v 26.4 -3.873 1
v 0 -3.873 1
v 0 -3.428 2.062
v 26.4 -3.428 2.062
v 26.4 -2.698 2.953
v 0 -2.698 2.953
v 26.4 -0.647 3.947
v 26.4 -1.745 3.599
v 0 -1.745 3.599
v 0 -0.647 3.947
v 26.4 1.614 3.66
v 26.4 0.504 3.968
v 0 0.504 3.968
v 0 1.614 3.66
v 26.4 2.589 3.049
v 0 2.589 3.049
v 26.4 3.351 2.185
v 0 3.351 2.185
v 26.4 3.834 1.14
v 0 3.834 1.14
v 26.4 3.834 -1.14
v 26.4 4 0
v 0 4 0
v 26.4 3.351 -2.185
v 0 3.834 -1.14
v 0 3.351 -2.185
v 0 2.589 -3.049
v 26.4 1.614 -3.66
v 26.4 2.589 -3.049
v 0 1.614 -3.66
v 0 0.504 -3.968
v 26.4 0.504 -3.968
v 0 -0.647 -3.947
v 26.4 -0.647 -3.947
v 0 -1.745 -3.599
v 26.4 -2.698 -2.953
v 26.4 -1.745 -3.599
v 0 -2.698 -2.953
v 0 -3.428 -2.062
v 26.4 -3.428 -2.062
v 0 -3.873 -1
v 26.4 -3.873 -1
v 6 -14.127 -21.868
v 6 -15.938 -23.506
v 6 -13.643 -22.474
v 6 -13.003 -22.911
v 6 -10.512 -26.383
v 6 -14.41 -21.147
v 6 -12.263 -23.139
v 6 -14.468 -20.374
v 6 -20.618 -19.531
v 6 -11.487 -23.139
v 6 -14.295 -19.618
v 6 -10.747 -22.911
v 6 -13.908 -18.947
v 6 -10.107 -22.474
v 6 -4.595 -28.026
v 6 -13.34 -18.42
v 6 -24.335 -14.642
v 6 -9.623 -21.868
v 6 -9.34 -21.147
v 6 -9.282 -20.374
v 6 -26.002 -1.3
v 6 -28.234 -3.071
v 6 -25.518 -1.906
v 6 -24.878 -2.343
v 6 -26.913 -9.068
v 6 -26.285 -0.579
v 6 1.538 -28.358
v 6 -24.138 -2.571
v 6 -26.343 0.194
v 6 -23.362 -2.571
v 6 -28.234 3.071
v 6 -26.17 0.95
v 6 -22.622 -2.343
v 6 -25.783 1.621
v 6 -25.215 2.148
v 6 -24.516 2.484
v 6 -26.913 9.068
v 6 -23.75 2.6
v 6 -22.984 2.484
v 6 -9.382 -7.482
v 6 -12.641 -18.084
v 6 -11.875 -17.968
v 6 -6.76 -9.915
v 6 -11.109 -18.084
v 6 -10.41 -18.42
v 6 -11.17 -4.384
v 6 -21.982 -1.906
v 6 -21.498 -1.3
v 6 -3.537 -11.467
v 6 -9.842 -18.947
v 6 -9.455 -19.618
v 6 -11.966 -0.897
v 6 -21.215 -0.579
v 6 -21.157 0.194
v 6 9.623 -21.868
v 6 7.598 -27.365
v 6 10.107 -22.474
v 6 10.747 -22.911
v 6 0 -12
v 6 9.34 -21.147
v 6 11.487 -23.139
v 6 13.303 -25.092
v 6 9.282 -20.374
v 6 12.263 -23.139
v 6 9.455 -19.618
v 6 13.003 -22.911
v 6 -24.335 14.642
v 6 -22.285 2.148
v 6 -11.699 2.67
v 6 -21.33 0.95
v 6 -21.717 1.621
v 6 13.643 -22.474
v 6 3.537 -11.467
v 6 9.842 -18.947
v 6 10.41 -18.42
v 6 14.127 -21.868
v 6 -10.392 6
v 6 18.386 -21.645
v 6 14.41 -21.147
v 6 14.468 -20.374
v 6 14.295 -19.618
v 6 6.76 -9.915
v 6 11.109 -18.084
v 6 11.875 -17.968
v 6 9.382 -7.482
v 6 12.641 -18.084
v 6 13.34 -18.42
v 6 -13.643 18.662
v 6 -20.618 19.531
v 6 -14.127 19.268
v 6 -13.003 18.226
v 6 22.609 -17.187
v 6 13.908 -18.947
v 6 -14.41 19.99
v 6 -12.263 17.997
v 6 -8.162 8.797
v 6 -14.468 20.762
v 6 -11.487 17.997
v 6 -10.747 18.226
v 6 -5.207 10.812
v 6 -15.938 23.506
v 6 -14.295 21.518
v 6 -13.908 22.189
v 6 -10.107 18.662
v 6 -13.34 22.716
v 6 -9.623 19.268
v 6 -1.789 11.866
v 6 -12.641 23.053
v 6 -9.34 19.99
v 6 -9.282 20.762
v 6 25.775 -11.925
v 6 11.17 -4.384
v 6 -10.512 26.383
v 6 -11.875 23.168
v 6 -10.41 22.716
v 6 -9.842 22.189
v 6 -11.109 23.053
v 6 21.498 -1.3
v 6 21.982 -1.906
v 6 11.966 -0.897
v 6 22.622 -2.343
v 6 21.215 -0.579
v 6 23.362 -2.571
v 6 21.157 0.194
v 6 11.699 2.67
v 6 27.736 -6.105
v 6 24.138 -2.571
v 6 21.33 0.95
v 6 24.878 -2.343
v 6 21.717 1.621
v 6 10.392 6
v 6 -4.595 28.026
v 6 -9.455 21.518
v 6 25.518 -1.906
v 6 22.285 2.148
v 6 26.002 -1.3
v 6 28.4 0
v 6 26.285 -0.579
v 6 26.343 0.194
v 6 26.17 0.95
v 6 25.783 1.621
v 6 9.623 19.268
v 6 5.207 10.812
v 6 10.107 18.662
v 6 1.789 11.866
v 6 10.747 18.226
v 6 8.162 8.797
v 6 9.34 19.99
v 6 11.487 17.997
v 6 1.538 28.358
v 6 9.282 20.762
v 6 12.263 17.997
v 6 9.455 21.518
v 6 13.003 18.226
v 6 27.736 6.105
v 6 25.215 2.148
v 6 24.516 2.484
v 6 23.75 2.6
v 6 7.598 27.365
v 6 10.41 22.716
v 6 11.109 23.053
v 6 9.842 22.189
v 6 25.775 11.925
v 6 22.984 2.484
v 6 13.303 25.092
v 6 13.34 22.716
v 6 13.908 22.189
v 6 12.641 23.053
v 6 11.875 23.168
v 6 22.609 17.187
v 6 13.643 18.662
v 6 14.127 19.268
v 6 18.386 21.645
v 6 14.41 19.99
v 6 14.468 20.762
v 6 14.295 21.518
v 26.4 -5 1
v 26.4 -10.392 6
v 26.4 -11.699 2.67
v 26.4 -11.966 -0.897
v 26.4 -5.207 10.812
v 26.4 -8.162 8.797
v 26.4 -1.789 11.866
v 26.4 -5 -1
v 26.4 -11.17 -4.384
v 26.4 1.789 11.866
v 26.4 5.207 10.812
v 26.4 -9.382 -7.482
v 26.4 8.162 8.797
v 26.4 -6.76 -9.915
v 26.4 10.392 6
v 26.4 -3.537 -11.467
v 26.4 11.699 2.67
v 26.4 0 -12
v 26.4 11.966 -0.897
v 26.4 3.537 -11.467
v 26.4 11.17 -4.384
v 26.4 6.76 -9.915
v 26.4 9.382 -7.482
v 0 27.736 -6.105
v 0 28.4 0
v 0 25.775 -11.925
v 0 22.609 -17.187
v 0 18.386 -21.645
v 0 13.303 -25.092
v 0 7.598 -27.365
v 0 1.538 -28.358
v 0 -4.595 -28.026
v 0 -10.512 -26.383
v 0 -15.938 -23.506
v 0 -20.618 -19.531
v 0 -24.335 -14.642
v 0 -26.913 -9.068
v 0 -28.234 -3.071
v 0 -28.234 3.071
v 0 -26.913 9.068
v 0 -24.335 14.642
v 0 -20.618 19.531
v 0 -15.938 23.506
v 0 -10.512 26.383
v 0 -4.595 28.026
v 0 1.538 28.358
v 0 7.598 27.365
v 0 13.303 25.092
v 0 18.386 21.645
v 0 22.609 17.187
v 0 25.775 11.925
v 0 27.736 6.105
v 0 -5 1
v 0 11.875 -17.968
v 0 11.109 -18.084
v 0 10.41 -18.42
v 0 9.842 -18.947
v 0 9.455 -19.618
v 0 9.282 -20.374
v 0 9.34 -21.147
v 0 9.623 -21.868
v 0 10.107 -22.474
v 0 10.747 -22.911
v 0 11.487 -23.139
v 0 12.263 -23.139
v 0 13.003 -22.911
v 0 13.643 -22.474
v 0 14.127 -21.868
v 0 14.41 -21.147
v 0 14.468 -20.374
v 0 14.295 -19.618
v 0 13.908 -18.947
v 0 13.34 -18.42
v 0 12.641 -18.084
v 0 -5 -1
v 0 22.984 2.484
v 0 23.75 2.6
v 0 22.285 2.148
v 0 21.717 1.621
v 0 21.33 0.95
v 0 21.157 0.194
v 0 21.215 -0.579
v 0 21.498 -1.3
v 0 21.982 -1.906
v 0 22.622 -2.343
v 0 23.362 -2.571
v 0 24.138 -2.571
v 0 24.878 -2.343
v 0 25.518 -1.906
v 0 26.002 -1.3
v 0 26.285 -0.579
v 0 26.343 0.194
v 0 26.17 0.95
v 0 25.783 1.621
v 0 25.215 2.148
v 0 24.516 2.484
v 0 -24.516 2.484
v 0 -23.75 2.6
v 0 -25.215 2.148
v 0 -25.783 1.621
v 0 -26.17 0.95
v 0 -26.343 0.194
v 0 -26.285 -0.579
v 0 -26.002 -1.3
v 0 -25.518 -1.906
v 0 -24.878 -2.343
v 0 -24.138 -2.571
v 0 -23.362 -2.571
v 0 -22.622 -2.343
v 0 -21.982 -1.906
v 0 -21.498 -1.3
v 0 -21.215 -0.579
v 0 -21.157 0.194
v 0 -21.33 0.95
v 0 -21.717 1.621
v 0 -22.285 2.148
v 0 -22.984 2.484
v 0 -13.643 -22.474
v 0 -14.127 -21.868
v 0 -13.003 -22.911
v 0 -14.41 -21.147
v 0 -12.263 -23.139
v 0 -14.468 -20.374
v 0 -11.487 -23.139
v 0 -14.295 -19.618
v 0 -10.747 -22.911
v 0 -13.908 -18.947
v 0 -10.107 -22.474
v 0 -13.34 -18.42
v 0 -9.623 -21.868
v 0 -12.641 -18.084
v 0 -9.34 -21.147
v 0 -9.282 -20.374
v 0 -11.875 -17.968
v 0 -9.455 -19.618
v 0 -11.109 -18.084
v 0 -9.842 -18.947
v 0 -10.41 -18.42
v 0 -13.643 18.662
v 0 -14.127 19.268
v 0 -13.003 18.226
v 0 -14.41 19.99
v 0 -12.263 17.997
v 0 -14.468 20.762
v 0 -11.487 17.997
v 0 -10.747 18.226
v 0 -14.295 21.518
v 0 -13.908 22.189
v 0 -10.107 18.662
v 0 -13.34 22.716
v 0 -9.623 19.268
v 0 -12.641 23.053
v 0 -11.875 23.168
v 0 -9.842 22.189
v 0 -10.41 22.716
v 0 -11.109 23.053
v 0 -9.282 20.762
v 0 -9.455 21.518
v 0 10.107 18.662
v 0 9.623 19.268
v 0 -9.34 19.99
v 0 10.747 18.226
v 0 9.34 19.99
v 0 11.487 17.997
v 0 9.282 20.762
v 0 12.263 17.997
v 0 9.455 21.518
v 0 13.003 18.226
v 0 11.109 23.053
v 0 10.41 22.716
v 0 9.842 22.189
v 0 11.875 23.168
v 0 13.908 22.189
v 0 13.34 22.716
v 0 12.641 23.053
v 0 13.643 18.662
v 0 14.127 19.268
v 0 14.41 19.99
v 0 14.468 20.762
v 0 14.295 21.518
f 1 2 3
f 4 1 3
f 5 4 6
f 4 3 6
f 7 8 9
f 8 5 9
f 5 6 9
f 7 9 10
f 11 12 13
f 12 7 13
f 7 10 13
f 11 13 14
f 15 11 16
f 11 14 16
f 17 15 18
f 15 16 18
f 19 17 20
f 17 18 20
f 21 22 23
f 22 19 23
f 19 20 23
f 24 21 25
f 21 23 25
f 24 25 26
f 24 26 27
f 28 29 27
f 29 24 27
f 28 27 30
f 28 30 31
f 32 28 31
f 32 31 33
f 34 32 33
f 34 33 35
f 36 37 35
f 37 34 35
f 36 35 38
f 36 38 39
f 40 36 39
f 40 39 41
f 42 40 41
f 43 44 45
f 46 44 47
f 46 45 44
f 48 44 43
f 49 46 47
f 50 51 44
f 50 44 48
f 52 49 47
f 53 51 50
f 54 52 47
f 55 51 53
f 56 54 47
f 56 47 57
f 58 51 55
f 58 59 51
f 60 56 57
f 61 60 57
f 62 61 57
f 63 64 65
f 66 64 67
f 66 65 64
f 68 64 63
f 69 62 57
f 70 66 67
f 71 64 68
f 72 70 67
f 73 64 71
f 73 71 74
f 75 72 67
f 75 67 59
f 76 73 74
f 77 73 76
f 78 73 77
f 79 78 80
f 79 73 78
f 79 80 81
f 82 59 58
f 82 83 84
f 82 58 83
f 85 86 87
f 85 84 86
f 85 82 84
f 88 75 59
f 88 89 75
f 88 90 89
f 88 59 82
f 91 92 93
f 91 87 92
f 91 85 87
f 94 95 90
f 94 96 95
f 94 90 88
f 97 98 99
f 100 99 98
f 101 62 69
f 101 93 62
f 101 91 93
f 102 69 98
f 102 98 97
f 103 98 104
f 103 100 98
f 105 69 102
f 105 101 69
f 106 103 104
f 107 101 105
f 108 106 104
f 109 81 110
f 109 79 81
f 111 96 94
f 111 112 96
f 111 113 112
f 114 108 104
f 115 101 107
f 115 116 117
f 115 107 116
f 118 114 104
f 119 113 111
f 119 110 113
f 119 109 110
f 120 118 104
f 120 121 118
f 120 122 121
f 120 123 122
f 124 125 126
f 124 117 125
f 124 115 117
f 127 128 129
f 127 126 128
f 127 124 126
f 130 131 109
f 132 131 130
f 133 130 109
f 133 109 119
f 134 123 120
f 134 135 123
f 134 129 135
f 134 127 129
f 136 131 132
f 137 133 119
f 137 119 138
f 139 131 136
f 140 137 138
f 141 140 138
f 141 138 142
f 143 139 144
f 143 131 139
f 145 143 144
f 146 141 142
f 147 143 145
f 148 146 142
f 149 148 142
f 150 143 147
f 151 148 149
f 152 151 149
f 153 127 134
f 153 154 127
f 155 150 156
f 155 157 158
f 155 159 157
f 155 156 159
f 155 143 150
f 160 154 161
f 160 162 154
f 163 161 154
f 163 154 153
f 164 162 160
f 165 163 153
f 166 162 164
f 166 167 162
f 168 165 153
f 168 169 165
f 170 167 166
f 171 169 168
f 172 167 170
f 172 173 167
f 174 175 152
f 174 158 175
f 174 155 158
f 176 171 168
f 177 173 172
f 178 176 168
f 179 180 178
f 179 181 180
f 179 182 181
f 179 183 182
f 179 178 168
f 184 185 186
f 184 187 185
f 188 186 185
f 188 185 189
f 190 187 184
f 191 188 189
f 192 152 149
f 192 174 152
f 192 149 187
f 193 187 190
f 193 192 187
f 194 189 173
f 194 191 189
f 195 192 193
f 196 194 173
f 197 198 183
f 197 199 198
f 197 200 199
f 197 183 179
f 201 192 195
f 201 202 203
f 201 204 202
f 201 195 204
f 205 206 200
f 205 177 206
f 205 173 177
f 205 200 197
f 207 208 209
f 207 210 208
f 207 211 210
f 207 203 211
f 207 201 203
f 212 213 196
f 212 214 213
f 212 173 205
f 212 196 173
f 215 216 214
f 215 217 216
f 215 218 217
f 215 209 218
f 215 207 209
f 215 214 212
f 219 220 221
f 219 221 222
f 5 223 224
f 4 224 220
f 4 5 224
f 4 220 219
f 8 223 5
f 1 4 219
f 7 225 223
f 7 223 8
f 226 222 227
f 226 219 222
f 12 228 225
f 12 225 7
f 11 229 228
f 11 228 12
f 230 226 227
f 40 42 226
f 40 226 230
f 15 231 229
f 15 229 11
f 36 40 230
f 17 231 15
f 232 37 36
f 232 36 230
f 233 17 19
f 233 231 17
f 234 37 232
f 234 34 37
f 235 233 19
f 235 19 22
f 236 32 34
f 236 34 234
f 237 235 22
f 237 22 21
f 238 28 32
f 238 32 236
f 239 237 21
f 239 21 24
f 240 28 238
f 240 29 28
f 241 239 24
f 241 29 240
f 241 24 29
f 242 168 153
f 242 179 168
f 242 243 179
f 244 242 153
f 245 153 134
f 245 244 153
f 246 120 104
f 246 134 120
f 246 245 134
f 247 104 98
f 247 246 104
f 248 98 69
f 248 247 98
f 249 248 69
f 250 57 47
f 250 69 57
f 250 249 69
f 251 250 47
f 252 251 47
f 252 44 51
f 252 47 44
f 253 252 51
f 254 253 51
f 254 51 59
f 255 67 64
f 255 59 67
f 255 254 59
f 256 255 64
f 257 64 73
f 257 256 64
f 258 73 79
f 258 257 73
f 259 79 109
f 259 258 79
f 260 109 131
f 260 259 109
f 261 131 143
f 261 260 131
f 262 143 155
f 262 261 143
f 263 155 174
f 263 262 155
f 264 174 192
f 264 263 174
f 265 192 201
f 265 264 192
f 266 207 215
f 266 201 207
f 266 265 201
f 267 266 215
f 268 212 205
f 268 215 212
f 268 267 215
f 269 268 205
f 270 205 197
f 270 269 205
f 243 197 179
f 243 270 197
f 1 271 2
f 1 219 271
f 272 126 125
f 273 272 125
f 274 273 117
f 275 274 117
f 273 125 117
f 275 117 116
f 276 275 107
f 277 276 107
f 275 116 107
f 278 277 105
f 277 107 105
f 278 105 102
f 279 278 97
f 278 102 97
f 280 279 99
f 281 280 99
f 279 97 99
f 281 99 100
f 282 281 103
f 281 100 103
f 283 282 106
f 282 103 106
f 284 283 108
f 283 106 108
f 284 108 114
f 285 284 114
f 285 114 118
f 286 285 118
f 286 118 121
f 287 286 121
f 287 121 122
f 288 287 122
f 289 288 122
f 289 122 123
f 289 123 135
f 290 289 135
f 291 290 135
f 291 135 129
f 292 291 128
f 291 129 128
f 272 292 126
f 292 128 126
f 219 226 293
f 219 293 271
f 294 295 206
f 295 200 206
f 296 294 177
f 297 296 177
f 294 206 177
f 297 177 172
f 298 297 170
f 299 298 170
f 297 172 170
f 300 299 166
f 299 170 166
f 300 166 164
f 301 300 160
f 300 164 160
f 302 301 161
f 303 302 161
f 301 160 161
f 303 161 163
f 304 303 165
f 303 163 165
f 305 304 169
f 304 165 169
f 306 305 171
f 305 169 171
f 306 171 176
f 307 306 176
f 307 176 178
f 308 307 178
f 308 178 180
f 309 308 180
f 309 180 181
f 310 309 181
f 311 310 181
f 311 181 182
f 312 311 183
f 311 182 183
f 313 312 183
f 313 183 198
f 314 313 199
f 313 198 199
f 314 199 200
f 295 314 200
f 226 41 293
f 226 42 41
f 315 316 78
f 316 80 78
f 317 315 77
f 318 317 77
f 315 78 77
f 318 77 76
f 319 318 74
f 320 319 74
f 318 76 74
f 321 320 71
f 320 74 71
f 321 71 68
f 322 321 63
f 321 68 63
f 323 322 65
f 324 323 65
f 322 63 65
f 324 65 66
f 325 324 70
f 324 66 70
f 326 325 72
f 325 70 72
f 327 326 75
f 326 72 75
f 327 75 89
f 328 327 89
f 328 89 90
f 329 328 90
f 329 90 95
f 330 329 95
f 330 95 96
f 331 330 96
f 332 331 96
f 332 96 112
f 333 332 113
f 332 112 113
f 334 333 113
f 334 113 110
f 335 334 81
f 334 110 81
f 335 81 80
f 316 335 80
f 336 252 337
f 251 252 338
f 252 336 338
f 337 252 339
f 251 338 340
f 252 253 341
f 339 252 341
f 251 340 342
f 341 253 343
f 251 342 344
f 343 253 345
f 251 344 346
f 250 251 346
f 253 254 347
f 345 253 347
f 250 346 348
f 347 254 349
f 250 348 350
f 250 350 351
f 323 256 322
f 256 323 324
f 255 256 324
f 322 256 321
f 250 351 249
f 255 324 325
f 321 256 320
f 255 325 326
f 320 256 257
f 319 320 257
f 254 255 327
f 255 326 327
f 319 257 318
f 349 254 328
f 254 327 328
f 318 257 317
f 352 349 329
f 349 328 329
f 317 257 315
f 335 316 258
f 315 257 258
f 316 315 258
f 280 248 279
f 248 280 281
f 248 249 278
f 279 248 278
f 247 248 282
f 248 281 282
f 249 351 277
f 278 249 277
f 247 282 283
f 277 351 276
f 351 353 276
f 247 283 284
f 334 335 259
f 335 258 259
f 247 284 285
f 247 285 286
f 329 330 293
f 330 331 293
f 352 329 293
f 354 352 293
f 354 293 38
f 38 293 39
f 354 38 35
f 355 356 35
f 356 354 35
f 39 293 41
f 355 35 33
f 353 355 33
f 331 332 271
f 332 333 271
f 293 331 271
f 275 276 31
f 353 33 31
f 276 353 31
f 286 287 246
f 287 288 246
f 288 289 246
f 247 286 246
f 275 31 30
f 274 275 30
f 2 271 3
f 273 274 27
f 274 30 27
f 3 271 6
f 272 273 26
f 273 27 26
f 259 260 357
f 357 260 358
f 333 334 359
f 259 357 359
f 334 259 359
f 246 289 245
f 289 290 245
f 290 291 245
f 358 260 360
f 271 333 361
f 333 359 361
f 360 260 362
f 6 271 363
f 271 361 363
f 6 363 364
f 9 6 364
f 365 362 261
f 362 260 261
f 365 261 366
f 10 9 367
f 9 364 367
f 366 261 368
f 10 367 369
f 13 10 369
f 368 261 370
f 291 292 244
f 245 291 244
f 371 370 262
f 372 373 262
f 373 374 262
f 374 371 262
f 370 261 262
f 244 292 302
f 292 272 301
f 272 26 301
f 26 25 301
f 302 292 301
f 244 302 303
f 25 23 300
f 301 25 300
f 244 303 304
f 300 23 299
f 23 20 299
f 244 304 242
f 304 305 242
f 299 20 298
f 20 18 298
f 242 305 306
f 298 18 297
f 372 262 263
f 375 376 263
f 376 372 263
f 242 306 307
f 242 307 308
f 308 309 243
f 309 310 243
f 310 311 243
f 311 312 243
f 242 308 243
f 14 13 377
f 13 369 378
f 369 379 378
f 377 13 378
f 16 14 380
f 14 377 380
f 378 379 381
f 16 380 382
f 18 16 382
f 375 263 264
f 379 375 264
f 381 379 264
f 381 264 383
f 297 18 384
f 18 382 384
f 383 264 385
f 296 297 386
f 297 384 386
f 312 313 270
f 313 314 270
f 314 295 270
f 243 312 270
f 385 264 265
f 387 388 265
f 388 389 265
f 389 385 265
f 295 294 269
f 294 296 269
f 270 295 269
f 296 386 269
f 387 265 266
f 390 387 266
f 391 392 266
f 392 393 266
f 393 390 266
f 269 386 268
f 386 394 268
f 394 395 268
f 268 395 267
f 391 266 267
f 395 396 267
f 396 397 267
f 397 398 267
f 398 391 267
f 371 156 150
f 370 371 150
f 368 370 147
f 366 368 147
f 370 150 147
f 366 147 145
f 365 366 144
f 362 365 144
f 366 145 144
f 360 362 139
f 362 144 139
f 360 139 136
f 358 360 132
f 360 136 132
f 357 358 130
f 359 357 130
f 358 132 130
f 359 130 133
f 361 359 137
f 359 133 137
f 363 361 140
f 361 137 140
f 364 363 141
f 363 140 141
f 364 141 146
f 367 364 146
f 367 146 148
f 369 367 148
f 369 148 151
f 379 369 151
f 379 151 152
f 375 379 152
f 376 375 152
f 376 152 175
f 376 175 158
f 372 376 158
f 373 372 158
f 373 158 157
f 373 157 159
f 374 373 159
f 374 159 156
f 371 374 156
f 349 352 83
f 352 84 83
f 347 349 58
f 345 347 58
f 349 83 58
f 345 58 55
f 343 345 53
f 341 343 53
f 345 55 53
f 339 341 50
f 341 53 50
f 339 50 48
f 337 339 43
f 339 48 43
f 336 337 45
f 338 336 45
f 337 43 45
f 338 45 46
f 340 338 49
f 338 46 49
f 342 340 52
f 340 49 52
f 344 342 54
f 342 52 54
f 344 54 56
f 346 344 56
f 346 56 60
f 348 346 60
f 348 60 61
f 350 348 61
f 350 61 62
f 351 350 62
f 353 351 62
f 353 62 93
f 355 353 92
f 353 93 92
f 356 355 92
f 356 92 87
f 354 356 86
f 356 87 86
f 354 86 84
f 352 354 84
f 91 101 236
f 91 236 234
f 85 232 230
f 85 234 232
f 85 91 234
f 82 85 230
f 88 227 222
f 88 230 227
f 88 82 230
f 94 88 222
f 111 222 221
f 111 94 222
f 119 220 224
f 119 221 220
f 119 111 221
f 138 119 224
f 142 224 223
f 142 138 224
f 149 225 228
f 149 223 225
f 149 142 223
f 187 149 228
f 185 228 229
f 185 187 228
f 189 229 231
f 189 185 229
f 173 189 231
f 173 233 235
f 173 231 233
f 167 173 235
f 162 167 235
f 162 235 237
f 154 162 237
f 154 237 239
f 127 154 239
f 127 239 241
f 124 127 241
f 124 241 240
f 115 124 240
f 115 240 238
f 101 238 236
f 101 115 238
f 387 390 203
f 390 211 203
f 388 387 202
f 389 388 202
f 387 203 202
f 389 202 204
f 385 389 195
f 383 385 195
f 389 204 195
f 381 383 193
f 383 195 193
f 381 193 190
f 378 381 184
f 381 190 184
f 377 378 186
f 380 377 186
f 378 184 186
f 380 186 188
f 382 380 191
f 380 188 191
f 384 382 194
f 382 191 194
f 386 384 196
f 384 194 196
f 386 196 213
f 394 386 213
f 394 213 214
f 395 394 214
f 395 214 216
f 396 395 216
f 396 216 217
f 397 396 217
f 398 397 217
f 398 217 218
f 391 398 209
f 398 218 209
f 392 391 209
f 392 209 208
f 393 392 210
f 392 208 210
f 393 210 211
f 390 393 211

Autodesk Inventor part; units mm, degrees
ref_plane "YZ Plane" through (0, 0, 0) normal (1, 0, 0) x (0, 1, 0)
ref_plane "XZ Plane" through (0, 0, 0) normal (0, 1, 0) x (-1, 0, 0)
ref_plane "XY Plane" through (0, 0, 0) normal (0, 0, 1) x (1, 0, 0)
sketch "スケッチ1" plane through (0, 0, 0) normal (1, 0, 0) x (0, 1, 0)
  point P0 (0, 0)
sketch "スケッチ2" plane through (0, 0, 0) normal (1, 0, 0) x (0, 1, 0)
  circle A0 centre (0, 0) radius 28.4
  dimension "d0" = 56.8
extrude "押し出し1" add sketch "スケッチ2" along normal blind 6
sketch "スケッチ3" plane through (6, 0, 0) normal (1, 0, 0) x (0, 0, -1)
  circle A0 centre (0, 0) radius 12
  dimension "d3" = 24
extrude "押し出し2" add sketch "スケッチ3" along normal blind 20.4
hole "穴2" at (26.4, 0, 0) direction (-1, 0, 0) diameter 8 end through all
sketch "スケッチ6" plane through (26.4, 0, 0) normal (1, 0, 0) x (0, 0, -1)
  line L0 (0, -5) -> (-1, -5)
  line L1 (-1, -5) -> (-1, -3)
  line L2 (-1, -5) -> (1, -5) construction
  line L3 (-1, -3) -> (1, -3)
  line L4 (1, -3) -> (1, -5)
  line L5 (1, -5) -> (0, -5)
  point P0 (0, 0)
  dimension "d32" = 5
  dimension "d33" = 1
  dimension "d35" = 2
  dimension "d36" = 90
  dimension "d37" = 2
  dimension "d38" = 90
  dimension "d39" = 2
  dimension "d40" = 90
extrude "押し出し5" cut sketch "スケッチ6" against normal blind 26.4
sketch "スケッチ7" plane through (0, 0, 0) normal (-1, 0, 0) x (0, 0, 1)
  circle A0 centre (0, 0) radius 23.75
  line L0 (0, -23.75) -> (-20.5681, -11.875)
  line L1 (-20.5681, -11.875) -> (-20.5681, 11.875)
  line L2 (-20.5681, 11.875) -> (0, 23.75)
  line L3 (0, 23.75) -> (20.5681, 11.875)
  line L4 (20.5681, 11.875) -> (20.5681, -11.875)
  line L5 (20.5681, -11.875) -> (0, -23.75)
  dimension "d43" = 47.5
hole "穴3" at (0, 11.875, 20.5681) at (0, 23.75, 0) at (0, -11.875, 20.5681) at (0, -23.75, 0) at (0, -11.875, -20.5681) at (0, 11.875, -20.5681) direction (1, 0, 0) diameter 5.2 end through all
properties part number "10mmkethub18025"
